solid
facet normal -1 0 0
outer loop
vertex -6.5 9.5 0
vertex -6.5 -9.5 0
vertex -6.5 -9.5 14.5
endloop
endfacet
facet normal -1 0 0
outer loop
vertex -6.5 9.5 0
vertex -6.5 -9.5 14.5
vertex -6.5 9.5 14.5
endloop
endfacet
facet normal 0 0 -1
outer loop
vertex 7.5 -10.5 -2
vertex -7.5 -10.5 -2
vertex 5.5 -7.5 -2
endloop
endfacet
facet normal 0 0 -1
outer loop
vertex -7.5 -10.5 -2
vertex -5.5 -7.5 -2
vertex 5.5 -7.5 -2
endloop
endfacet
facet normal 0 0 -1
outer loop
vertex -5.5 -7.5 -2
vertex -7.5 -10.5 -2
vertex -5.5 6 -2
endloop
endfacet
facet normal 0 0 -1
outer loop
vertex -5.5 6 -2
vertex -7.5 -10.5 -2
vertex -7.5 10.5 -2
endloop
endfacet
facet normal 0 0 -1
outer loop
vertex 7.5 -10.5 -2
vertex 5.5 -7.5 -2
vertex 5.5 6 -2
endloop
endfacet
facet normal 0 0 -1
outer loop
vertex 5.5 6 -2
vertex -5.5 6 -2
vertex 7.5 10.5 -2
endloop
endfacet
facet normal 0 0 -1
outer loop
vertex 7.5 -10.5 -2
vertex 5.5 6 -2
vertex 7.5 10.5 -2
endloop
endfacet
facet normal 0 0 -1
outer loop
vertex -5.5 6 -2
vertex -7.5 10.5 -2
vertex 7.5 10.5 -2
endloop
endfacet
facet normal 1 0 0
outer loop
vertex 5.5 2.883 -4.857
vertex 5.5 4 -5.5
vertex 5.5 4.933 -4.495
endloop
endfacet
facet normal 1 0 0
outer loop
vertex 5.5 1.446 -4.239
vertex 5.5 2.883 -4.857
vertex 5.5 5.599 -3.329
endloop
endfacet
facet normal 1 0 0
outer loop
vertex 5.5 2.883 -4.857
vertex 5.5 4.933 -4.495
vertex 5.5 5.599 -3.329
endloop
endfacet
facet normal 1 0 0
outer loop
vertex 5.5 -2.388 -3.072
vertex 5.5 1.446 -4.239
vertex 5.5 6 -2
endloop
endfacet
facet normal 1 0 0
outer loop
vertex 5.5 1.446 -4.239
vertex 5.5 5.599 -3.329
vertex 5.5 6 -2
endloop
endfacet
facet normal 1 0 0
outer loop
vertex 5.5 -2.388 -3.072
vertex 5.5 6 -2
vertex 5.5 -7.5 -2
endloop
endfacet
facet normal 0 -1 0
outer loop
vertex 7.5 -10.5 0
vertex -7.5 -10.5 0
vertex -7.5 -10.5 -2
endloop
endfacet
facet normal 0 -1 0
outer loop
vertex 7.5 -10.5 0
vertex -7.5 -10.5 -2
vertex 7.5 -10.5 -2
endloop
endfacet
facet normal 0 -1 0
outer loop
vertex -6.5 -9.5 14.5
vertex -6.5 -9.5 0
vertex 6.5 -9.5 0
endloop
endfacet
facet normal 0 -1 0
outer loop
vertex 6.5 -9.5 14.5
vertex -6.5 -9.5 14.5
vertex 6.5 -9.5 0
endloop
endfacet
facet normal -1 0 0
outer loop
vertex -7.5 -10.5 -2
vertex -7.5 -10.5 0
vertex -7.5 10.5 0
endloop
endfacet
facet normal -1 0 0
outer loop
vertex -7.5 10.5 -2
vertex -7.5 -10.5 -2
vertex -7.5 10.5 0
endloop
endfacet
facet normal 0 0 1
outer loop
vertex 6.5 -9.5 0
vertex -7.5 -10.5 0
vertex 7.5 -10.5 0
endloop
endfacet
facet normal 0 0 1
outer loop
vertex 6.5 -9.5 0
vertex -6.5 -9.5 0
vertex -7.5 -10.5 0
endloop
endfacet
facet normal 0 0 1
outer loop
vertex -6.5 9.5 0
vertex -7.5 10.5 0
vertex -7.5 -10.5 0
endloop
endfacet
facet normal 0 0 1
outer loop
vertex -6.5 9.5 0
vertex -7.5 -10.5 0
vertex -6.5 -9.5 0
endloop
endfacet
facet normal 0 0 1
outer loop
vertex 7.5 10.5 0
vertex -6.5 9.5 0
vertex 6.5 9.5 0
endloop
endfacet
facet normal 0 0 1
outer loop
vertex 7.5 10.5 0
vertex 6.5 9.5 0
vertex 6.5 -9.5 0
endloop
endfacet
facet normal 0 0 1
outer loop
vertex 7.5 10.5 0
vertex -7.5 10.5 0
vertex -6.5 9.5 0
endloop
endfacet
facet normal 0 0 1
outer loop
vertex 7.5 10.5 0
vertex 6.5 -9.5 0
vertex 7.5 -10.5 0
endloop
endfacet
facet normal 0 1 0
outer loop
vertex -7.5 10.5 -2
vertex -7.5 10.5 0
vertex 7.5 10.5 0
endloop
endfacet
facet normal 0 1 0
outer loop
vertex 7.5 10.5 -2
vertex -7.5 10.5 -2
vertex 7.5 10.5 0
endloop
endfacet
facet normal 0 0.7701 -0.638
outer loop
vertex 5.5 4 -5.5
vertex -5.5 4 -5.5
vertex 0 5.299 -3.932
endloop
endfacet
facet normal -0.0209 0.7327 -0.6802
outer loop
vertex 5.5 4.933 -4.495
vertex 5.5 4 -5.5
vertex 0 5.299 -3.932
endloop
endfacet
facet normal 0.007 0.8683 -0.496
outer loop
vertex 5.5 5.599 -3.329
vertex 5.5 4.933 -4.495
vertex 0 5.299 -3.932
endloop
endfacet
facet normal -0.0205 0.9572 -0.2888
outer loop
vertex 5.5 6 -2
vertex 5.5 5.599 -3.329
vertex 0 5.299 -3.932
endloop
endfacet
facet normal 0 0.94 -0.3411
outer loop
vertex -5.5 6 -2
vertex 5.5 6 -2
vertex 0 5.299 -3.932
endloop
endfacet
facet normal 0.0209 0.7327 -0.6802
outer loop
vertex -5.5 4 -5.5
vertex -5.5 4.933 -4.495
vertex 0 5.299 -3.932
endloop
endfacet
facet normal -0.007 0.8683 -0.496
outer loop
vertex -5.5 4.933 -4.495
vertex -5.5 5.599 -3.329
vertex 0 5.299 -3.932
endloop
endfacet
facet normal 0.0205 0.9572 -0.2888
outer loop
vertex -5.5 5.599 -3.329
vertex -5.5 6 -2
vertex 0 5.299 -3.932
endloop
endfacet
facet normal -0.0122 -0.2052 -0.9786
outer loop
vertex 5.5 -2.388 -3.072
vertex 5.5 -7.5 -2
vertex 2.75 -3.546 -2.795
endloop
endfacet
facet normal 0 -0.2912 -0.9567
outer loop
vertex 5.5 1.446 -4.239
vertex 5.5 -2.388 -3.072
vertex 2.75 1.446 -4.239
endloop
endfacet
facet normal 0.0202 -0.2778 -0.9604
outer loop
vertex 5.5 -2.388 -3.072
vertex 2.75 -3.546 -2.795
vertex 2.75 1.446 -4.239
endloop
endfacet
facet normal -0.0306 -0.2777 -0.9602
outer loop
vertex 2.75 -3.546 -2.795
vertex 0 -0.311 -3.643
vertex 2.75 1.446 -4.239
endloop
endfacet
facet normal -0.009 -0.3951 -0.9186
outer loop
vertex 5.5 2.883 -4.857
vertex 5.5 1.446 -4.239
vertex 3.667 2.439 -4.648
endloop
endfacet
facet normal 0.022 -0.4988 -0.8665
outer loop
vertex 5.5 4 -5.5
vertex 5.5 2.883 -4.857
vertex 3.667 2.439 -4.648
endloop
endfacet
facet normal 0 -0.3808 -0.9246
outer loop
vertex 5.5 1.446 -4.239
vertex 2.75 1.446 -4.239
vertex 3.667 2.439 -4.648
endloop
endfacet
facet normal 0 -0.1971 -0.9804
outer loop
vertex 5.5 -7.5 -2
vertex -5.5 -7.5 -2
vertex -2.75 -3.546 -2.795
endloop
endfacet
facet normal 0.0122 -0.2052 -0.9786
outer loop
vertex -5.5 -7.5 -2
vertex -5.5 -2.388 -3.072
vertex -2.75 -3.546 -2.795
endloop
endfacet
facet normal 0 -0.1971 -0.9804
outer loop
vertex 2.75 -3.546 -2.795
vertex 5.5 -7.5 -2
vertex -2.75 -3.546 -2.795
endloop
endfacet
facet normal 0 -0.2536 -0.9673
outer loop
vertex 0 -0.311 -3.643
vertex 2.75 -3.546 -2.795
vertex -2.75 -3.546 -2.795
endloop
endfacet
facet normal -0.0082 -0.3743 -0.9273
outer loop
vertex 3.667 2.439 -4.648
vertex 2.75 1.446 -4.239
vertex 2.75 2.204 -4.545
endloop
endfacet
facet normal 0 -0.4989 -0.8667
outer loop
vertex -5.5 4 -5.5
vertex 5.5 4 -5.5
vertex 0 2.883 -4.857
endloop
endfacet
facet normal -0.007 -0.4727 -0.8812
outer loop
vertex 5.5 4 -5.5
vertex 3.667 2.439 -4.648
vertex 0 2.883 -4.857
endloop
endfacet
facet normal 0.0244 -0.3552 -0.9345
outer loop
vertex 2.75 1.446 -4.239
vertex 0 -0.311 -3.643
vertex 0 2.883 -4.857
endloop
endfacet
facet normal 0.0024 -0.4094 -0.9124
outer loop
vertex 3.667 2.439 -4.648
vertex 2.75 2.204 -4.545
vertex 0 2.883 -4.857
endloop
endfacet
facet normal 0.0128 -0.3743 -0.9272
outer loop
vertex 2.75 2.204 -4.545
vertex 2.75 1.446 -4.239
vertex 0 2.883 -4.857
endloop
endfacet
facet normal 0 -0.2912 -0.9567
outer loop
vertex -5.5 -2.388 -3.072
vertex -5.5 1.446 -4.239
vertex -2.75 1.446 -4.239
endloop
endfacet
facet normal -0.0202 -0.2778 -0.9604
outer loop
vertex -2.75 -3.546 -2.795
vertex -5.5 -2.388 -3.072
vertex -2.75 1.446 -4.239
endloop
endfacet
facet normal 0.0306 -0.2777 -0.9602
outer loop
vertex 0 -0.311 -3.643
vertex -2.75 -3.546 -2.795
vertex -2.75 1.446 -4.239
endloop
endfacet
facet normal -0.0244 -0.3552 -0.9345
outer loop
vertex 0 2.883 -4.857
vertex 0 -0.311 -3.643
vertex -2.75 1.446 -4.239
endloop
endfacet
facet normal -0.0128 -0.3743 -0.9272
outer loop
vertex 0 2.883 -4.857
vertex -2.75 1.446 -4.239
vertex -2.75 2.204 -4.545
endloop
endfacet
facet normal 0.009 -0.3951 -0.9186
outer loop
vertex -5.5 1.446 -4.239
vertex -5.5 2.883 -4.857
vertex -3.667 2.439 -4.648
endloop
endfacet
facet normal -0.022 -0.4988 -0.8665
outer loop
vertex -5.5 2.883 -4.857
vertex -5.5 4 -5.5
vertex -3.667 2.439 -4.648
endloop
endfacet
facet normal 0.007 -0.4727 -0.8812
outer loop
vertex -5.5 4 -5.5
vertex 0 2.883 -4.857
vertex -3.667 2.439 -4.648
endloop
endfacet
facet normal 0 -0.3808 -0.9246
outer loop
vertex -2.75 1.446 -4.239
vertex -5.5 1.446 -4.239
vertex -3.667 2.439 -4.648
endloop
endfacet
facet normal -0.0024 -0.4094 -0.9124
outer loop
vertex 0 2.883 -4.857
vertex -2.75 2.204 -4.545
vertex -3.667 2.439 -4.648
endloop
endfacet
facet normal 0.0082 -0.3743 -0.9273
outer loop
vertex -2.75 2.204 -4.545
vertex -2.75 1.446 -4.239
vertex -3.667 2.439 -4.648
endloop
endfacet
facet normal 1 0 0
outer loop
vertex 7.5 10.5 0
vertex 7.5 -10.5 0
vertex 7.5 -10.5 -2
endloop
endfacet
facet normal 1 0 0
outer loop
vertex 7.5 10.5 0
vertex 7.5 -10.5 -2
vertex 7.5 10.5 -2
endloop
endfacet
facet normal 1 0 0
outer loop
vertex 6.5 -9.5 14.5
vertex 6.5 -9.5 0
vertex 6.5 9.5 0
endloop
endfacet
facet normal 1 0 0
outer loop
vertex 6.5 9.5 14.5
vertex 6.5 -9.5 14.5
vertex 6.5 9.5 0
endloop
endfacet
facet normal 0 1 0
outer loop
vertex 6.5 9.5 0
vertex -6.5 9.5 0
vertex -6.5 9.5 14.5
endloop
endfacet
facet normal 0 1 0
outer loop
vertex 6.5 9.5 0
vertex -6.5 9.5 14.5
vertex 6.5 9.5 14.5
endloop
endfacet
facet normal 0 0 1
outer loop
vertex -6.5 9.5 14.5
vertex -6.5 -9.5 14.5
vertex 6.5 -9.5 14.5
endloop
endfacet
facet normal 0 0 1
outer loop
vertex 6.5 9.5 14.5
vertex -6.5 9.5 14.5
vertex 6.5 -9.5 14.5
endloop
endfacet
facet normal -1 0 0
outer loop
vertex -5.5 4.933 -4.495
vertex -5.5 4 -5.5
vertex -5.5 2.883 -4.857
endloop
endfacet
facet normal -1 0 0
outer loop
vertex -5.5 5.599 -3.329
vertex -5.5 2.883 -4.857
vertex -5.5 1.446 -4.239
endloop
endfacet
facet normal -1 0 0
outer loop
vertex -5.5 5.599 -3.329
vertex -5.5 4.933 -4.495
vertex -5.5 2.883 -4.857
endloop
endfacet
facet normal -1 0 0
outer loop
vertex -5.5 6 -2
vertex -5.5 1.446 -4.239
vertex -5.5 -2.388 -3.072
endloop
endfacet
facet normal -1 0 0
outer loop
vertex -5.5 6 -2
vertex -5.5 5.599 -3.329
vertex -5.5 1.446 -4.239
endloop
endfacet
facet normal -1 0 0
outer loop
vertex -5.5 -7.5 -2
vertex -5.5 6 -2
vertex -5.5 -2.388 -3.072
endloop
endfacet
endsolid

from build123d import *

# Parameters (mm, degrees)
SKETCH1_W                = 13
SKETCH1_H                = 19
BOSS_EXTRUDE1_DEPTH      = 14.5
SKETCH2_W                = 15
SKETCH2_H                = 21
BOSS_EXTRUDE2_DEPTH      = 2
BOSS_EXTRUDE3_DEPTH      = 5.5
BOSS_EXTRUDE3_DEPTH_BACK = 5.5


with BuildPart() as part:
    # Sketch1 → Boss-Extrude1 (new body)
    with BuildSketch(Plane.XY):
        Rectangle(SKETCH1_W, SKETCH1_H)
    extrude(amount=BOSS_EXTRUDE1_DEPTH)

    # Sketch2 → Boss-Extrude2 (add)
    with BuildSketch(Plane.XY):
        Rectangle(SKETCH2_W, SKETCH2_H)
    extrude(amount=-BOSS_EXTRUDE2_DEPTH)

    # Sketch3 → Boss-Extrude3 (add, two sides: drawn at the far end of the back side and taken through both)
    with BuildSketch(Plane(origin=(0, 0, 0), x_dir=(0, 0, -1), z_dir=(1, 0, 0)).offset(-BOSS_EXTRUDE3_DEPTH_BACK)):
        with BuildLine():
            Line((2, -7.5), (2, 6))
            add(Edge.make_bspline(
                [(5.5, 4), (4.114672483, 5.598162681), (2, 6)],
                knots=[0, 0, 0, 1, 1, 1], degree=2))
            add(Edge.make_bspline(
                [(2, -7.5), (3.536685503, 1.127808031), (5.5, 4)],
                knots=[0, 0, 0, 1, 1, 1], degree=2))
        make_face()
    extrude(amount=BOSS_EXTRUDE3_DEPTH + BOSS_EXTRUDE3_DEPTH_BACK)


solid = part.part
